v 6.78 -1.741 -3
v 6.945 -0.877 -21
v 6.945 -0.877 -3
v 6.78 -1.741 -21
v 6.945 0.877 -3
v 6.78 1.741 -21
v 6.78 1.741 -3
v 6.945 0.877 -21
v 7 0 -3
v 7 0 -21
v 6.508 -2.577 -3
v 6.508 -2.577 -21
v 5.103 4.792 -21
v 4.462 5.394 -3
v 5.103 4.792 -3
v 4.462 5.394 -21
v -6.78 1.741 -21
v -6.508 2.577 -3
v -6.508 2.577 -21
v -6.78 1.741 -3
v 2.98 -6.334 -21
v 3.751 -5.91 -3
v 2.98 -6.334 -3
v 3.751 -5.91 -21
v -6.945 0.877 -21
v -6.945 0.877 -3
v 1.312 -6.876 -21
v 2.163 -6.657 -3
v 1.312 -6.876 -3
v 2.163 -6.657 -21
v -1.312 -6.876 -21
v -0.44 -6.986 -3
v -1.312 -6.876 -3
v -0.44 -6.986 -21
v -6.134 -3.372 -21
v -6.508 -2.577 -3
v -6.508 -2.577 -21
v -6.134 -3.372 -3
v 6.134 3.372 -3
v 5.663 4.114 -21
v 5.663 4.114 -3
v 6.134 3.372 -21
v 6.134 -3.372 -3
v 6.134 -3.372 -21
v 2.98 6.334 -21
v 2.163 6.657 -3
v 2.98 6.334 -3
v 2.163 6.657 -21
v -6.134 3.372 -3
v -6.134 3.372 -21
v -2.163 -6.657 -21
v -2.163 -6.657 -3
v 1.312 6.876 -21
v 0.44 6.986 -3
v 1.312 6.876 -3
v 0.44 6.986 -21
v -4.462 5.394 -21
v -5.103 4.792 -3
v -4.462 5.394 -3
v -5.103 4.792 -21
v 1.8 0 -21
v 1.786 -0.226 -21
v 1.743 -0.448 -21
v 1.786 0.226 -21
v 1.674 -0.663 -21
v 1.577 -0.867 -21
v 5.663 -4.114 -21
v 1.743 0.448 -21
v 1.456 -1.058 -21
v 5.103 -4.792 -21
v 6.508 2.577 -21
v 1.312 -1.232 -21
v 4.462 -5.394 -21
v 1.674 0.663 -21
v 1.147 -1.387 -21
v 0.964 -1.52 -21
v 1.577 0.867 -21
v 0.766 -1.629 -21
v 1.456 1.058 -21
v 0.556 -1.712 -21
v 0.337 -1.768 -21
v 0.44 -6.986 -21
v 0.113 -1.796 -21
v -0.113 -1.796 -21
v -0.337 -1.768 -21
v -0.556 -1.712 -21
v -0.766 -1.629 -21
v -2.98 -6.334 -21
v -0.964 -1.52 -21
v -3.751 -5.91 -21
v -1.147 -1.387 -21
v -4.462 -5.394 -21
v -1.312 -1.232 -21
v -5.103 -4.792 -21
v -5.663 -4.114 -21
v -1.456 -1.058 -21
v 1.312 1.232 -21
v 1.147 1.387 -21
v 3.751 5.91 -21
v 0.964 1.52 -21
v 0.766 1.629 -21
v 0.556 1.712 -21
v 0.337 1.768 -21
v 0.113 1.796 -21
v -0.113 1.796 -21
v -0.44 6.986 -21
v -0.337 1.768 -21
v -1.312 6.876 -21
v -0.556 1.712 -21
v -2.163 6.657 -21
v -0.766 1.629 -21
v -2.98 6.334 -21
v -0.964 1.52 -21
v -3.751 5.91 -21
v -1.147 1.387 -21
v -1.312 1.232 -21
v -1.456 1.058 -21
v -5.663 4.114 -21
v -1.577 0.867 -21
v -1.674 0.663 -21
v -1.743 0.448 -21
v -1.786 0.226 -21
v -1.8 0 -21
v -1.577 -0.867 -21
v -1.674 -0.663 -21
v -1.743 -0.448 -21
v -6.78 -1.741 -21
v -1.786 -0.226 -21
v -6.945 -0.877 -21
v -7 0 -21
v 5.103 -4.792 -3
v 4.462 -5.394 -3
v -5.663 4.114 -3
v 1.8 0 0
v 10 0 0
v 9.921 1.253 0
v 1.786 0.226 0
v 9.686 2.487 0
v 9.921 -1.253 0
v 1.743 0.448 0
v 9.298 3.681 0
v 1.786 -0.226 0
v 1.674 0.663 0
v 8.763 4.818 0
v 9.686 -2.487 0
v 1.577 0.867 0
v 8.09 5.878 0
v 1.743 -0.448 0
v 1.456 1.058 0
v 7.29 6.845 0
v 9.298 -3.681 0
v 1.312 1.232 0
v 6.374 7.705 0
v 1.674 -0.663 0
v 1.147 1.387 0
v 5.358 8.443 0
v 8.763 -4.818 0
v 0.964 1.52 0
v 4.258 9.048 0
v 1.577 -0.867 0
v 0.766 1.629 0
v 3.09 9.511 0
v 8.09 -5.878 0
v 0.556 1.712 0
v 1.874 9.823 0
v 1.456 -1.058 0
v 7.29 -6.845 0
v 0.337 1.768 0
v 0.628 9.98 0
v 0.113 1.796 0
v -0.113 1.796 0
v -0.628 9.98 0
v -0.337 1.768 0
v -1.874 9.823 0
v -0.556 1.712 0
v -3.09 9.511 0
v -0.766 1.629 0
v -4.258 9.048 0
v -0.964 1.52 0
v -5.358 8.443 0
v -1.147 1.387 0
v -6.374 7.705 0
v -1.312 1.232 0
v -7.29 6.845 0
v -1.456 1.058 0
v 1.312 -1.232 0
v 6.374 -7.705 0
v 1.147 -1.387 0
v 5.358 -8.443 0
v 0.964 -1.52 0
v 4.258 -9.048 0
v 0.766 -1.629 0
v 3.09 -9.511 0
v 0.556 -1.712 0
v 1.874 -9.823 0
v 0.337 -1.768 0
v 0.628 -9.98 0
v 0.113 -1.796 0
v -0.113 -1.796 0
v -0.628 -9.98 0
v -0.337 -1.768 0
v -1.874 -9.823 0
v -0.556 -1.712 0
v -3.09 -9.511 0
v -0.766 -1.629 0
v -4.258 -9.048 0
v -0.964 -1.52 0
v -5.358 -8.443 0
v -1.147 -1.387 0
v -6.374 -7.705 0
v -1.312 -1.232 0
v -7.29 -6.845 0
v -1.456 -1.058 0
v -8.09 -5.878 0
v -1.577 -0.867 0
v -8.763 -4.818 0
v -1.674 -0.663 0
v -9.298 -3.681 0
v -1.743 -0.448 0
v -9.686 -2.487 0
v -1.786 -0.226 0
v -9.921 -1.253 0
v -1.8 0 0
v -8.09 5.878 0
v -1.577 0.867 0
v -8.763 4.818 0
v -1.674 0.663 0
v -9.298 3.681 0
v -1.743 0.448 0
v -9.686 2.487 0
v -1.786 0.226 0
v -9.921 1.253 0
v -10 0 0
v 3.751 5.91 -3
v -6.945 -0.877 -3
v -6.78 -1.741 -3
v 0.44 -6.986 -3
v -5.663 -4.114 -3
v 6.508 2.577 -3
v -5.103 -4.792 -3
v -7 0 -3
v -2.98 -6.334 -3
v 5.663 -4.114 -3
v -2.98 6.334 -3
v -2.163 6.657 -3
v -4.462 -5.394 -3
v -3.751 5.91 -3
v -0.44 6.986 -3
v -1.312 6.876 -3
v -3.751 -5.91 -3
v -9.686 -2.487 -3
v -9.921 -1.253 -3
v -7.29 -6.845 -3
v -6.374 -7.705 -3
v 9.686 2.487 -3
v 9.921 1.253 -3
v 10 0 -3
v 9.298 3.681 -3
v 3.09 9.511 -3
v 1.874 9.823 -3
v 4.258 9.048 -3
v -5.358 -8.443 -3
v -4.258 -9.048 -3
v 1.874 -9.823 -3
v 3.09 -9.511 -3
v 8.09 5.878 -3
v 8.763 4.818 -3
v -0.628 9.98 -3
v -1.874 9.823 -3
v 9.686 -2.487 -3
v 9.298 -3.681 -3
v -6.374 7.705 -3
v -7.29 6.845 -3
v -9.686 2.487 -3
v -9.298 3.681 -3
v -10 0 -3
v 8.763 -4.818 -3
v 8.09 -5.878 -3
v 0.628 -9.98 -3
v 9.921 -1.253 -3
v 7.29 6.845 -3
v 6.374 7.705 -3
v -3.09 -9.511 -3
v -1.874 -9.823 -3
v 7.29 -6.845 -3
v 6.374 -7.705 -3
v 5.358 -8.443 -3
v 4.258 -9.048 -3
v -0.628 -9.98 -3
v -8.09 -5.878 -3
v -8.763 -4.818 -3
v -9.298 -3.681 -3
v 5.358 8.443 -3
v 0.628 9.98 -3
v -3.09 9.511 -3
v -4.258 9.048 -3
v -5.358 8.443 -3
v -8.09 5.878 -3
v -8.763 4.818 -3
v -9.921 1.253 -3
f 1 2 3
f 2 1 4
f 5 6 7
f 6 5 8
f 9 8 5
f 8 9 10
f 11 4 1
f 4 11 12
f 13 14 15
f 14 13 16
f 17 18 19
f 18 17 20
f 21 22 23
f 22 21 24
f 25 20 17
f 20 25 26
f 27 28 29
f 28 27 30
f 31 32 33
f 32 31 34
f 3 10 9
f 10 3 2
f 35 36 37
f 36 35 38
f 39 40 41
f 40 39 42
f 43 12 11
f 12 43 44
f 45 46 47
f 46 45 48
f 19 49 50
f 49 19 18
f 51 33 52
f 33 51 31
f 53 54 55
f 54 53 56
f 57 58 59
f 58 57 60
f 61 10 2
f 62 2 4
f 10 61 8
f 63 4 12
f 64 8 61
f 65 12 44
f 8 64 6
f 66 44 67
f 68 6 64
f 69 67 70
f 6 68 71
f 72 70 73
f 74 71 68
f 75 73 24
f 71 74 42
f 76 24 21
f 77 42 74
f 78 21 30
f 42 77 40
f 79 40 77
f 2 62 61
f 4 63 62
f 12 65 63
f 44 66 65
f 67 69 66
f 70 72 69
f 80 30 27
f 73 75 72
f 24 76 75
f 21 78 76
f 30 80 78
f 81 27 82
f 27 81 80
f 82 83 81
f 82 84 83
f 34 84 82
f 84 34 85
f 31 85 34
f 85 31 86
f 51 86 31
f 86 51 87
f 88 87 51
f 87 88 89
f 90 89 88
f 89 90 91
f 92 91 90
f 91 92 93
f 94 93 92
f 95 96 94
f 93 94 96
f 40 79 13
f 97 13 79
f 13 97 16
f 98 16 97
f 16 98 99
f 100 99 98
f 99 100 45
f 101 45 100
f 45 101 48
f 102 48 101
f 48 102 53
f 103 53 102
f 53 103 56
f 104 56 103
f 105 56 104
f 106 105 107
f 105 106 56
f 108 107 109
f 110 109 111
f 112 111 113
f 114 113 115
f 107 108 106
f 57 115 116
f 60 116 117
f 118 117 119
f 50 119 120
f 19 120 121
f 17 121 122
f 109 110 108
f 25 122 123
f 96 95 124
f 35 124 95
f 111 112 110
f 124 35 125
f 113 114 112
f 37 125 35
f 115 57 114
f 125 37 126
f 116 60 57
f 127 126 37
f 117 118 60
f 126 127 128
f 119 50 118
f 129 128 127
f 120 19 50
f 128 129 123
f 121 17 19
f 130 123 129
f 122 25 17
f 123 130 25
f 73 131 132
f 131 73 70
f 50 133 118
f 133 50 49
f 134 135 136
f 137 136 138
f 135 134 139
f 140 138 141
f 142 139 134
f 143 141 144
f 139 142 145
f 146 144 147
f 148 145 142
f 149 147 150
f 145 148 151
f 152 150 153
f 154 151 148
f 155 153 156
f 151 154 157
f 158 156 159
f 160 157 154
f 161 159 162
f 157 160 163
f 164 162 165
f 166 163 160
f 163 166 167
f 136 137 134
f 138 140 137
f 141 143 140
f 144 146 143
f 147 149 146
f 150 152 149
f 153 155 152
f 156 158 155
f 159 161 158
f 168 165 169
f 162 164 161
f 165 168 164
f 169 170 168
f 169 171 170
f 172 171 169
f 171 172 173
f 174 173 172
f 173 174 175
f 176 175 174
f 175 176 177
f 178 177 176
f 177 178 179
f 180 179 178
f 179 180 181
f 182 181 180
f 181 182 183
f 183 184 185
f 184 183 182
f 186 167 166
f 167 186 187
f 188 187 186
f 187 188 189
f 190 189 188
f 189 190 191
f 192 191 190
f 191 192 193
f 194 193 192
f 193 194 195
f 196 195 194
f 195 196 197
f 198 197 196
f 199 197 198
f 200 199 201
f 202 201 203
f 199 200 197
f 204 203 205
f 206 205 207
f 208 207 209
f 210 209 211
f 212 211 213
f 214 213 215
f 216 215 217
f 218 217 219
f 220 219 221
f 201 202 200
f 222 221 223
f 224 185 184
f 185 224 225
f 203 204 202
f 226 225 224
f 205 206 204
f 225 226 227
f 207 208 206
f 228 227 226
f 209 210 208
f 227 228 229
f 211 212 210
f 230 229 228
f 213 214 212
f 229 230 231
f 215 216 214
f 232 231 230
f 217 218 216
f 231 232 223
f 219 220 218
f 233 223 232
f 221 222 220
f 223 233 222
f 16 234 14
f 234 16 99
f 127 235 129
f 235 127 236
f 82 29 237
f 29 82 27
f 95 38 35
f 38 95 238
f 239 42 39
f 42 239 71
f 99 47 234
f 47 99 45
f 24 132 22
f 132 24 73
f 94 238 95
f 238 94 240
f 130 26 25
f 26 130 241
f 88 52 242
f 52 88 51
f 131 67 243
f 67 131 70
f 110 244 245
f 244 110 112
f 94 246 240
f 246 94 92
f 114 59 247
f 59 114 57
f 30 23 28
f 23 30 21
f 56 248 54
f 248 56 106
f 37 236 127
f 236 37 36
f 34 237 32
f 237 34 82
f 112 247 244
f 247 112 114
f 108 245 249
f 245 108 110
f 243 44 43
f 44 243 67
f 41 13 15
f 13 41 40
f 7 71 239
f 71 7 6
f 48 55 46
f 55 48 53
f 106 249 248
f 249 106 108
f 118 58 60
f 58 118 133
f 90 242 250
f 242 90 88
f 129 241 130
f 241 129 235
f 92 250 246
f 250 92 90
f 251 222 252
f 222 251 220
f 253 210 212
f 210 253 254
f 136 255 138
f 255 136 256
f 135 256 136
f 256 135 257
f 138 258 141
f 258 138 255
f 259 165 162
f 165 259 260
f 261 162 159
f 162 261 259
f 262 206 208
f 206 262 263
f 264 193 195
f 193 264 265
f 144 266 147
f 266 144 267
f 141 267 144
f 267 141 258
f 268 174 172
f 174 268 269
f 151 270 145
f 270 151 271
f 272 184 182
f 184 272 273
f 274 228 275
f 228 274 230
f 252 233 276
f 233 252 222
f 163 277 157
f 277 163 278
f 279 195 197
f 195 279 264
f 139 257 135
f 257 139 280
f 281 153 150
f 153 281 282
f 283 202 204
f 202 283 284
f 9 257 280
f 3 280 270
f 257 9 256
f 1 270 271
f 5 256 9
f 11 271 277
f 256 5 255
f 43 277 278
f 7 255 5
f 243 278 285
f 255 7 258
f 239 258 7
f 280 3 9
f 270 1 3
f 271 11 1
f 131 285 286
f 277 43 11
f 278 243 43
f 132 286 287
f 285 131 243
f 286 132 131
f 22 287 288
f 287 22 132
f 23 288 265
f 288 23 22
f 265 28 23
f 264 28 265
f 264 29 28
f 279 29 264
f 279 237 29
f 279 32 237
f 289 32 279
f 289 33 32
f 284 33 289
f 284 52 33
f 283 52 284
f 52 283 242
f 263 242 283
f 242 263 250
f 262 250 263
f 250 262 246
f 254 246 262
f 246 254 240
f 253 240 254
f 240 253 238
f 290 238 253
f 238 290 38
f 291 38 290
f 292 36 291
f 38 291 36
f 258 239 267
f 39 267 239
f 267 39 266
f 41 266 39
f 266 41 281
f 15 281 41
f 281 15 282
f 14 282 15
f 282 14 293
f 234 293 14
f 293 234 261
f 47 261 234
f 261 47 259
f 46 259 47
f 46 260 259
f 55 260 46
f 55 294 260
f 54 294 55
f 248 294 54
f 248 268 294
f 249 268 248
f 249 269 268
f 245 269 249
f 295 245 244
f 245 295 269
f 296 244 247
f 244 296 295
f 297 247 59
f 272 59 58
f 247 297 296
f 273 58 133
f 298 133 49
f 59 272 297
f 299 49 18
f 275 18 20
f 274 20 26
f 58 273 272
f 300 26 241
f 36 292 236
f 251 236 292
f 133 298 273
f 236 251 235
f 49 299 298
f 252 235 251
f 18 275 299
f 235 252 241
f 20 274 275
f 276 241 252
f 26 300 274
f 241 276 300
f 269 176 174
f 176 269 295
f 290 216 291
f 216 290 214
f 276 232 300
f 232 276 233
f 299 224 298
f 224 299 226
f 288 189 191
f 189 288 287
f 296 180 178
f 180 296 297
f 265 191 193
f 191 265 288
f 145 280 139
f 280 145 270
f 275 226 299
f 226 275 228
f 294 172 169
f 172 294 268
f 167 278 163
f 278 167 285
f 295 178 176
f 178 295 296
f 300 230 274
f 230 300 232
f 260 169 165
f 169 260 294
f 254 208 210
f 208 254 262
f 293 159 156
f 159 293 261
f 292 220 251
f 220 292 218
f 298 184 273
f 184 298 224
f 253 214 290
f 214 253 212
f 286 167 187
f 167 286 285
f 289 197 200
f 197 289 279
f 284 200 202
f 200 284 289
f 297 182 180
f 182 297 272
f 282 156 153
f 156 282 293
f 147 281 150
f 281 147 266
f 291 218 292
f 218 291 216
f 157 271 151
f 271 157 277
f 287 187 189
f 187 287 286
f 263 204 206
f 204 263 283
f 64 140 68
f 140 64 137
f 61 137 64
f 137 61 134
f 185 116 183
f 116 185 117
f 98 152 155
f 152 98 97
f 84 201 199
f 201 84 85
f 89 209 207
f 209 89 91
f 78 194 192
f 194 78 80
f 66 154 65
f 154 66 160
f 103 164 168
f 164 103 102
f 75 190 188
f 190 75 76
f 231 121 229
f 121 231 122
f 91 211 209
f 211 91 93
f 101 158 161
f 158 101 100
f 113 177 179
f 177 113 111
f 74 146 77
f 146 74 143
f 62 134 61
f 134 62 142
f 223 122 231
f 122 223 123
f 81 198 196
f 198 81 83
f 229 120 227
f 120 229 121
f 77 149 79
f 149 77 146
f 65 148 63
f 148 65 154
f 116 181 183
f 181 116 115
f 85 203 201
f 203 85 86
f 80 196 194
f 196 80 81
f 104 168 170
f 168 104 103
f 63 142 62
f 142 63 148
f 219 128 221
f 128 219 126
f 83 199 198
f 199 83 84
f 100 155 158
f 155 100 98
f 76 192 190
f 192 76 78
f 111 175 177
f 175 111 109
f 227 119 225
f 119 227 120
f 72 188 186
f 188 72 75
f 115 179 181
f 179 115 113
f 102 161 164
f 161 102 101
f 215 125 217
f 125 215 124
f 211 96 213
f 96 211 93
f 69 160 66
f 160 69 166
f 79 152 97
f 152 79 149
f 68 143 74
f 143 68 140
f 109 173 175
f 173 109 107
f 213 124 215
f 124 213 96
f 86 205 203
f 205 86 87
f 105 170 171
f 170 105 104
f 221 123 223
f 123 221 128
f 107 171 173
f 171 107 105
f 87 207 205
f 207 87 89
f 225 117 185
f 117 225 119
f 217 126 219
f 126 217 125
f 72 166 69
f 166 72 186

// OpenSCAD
$fn = 50;


difference() {
	union() {
		translate(v = [0, 0, -21.0000000000]) {
			cylinder(h = 21, r = 7.0000000000);
		}
		translate(v = [0, 0, -3.0000000000]) {
			cylinder(h = 3, r = 10.0000000000);
		}
	}
	union() {
		#translate(v = [0, 0, -21]) {
			cylinder(h = 21, r = 1.8000000000);
		}
	}
}
